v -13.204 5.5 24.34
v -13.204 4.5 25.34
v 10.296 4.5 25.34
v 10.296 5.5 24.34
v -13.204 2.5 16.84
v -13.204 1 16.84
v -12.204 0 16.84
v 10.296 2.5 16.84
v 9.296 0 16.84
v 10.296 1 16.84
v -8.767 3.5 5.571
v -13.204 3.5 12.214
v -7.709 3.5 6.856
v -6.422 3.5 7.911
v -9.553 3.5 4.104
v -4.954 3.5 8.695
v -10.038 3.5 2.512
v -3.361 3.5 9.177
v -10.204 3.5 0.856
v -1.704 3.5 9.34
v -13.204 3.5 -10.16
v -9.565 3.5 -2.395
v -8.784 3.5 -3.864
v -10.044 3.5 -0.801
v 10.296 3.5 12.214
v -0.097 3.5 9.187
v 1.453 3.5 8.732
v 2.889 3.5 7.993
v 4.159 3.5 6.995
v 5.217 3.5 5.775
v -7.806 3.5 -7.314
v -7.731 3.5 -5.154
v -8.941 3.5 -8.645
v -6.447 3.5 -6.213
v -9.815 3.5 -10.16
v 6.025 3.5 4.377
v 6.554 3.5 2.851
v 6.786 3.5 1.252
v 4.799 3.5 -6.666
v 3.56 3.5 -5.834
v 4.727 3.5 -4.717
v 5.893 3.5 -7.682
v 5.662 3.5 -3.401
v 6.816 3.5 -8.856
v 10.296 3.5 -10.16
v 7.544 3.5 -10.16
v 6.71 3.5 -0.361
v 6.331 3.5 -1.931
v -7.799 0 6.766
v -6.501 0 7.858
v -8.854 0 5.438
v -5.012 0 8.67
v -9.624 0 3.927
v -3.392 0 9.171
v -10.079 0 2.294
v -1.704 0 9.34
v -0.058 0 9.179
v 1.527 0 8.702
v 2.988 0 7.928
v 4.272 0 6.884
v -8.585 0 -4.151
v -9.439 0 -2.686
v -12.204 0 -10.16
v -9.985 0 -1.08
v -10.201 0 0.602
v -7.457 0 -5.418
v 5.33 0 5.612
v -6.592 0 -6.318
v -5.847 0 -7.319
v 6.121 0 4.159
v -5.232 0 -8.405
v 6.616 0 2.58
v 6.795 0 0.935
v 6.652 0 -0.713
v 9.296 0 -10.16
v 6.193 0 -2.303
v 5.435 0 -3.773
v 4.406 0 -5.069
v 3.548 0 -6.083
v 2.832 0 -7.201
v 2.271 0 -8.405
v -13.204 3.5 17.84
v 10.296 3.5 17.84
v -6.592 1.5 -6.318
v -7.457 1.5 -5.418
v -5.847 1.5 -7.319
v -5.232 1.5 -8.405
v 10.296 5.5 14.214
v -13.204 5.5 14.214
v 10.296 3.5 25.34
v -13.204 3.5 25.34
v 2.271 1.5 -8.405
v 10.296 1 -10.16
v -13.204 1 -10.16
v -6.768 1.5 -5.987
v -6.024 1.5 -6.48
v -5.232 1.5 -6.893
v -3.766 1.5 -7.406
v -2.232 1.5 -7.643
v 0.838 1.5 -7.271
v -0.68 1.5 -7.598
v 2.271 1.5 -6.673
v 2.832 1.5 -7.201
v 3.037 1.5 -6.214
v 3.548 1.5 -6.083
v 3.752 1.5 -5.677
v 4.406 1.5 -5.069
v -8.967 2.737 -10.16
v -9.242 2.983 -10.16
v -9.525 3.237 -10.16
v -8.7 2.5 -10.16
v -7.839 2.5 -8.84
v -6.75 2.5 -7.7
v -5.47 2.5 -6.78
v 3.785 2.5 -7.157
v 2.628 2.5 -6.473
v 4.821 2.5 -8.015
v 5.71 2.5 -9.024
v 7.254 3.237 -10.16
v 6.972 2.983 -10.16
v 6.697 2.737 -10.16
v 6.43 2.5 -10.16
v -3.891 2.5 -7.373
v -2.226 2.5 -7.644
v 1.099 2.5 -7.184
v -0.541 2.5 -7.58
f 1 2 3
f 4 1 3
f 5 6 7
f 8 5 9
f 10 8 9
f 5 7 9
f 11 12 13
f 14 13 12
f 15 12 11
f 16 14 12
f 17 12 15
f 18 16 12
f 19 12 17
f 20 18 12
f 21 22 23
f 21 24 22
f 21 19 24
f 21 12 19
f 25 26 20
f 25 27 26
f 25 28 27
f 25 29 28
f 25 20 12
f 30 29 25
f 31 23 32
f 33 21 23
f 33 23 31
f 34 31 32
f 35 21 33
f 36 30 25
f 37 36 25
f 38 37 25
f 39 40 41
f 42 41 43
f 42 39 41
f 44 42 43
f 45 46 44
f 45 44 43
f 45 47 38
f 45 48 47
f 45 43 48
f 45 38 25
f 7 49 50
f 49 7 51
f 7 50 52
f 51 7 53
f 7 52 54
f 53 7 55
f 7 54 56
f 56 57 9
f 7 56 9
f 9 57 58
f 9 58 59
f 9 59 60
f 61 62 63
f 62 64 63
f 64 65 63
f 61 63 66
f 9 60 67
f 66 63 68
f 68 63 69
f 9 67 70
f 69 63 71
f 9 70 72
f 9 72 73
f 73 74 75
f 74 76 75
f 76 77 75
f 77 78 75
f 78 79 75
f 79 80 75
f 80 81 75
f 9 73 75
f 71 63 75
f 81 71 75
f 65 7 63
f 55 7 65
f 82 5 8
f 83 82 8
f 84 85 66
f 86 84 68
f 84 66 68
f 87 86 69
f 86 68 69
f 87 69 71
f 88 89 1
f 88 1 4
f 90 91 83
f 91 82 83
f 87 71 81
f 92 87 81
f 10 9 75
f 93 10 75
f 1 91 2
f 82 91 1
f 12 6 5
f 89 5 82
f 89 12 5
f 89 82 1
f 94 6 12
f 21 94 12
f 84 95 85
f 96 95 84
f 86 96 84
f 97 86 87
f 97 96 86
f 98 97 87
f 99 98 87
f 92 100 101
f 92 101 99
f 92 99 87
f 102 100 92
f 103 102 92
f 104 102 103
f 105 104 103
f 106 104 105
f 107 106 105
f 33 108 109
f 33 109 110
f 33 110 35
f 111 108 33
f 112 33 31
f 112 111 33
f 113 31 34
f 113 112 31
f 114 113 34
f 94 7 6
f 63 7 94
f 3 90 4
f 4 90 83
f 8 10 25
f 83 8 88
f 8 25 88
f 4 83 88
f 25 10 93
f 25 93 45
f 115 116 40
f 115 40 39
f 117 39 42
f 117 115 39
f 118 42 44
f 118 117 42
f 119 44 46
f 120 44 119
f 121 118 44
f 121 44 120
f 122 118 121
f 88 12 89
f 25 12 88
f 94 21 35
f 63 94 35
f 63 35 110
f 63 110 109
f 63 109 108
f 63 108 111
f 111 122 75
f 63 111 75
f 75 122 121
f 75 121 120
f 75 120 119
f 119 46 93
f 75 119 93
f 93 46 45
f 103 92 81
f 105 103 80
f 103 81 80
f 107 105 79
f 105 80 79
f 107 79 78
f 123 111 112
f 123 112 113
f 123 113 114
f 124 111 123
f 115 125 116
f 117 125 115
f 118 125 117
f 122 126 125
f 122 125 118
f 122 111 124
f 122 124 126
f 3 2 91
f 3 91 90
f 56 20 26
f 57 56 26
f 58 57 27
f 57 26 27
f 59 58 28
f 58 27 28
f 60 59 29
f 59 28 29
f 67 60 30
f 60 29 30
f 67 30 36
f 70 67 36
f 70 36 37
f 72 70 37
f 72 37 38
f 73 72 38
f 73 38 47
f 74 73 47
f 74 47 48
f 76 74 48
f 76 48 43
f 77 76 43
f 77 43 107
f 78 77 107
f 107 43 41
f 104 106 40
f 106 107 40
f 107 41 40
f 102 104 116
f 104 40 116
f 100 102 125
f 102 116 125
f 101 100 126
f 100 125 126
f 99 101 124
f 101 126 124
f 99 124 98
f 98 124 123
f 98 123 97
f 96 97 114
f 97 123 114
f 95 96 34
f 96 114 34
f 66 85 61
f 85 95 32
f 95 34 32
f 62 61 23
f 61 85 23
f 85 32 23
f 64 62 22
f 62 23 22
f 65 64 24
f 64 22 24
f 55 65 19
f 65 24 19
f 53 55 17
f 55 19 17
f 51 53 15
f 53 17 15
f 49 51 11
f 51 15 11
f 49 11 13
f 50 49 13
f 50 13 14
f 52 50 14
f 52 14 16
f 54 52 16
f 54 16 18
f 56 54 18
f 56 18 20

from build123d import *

# Parameters (mm, degrees)
SKETCH1_W           = 23.5
SKETCH1_H           = 28
BOSS_EXTRUDE1_DEPTH = 3.5
CHAMFER1_SIZE       = 1
SKETCH2_R           = 8.5
CUT_EXTRUDE1_DEPTH  = 3.5
SKETCH3_R           = 9.555523526
CUT_EXTRUDE3_DEPTH  = 1
CHAMFER2_SIZE       = 1
SKETCH4_W           = 23.5
SKETCH4_H           = 9.126491789
BOSS_EXTRUDE2_DEPTH = 2
CHAMFER3_SIZE       = 2
CHAMFER4_SIZE       = 1
SKETCH5_W           = 7.502434646
SKETCH5_H           = 2.891999948
CUT_EXTRUDE4_DEPTH  = 1.5
FILLET1_R           = 10
SKETCH6_W           = 23.5
SKETCH6_H           = 2
BOSS_EXTRUDE3_DEPTH = 2
SKETCH7_W           = 25.736202914
SKETCH7_H           = 1.90415655
CUT_EXTRUDE6_DEPTH  = 7
CHAMFER5_SIZE       = 1


# Some blends are built 0.0001 mm under size
with BuildPart() as part:
    # Sketch1 → Boss-Extrude1 (new body)
    with BuildSketch(Plane(origin=(0, 0, 0), x_dir=(1, 0, 0), z_dir=(0, 1, 0))):
        with Locations((-1.454397394, -2.840390879)):
            Rectangle(SKETCH1_W, SKETCH1_H)
    extrude(amount=BOSS_EXTRUDE1_DEPTH)

    # Chamfer1
    chamfer1_edges = [part.edges().sort_by_distance(p)[0] for p in [
        (-1.454397394, 0, -11.159609121),
        (10.295602606, 0, 2.840390879),
        (-13.204397394, 0, 2.840390879),
    ]]
    chamfer(chamfer1_edges, length=CHAMFER1_SIZE)

    # Sketch2 → Cut-Extrude1 (cut)
    with BuildSketch(Plane(origin=(0, 3.5, 0), x_dir=(1, 0, 0), z_dir=(0, 1, 0))):
        with Locations(Location((-1.704397394, -0.840390879, 0), (0, 0, 270))):
            Circle(SKETCH2_R)
    extrude(amount=-CUT_EXTRUDE1_DEPTH, mode=Mode.SUBTRACT)

    # Sketch3 → Cut-Extrude3 (cut)
    with BuildSketch(Plane(origin=(0, 3.5, 0), x_dir=(1, 0, 0), z_dir=(0, 1, 0))):
        with Locations((-1.135292968, 14.156160389)):
            Circle(SKETCH3_R)
    extrude(amount=-CUT_EXTRUDE3_DEPTH, mode=Mode.SUBTRACT)

    # Chamfer2
    chamfer2_edges = [part.edges().sort_by_distance(p)[0] for p in [
        (-8.74141347, 2.5, -8.372134044),
        (6.246016299, 2.5, -8.087857218),
    ]]
    chamfer(chamfer2_edges, length=CHAMFER2_SIZE - 0.0001)  # a hair under: the kernel refuses the full size

    # Sketch4 → Boss-Extrude2 (add)
    with BuildSketch(Plane(origin=(0, 3.5, 0), x_dir=(1, 0, 0), z_dir=(0, 1, 0))):
        with Locations((-1.454397394, -18.777144985)):
            Rectangle(SKETCH4_W, SKETCH4_H)
    extrude(amount=BOSS_EXTRUDE2_DEPTH)

    # Chamfer3
    chamfer3_edges = [part.edges().sort_by_distance(p)[0] for p in [
        (-1.454397394, 3.5, 14.21389909),
    ]]
    chamfer(chamfer3_edges, length=CHAMFER3_SIZE - 0.0001)  # a hair under: the kernel refuses the full size

    # Chamfer4
    chamfer4_edges = [part.edges().sort_by_distance(p)[0] for p in [
        (-1.454397394, 3.5, 16.840390879),
    ]]
    chamfer(chamfer4_edges, length=CHAMFER4_SIZE)

    # Sketch5 → Cut-Extrude4 (cut)
    with BuildSketch(Plane.XZ):
        with Locations((-1.480612468, -6.958763205)):
            Rectangle(SKETCH5_W, SKETCH5_H)
    extrude(amount=-CUT_EXTRUDE4_DEPTH, mode=Mode.SUBTRACT)

    # Fillet1
    # the kernel refuses this fillet: 10 mm, written as the material it takes off along each edge
    with BuildSketch(Plane(origin=(2.270604855, -6.676580089, -6.67288784), x_dir=(0.799474341505259, 0, 0.6007002391165933), z_dir=(0, 1, 0))) as fillet1_piece_1:
        with BuildLine():
            CenterArc((4.241592057, 9.875833363), FILLET1_R, 238.116555861, 22.84506635)
            Line((-1.04033793, 1.384589896), (0, 0))
            ThreePointArc((0, 0), (1.335316018, 0.105541642), (2.670632036, 0))
        make_face()
    extrude(amount=8.176580089, mode=Mode.SUBTRACT)
    with BuildSketch(Plane(origin=(-5.231829791, -6.674182658, -6.89312195), x_dir=(-0.8333660281094135, 0, 0.552721505998401), z_dir=(0, 1, 0))) as fillet1_piece_2:
        with BuildLine():
            CenterArc((4.240068983, -9.875923079), FILLET1_R, 99.035105105, 21.466237943)
            Line((-0.835516616, -1.259750447), (0, 0))
            ThreePointArc((0, 0), (1.334836532, -0.105465383), (2.669673063, 0))
        make_face()
    extrude(amount=8.174182658, mode=Mode.SUBTRACT)

    # Sketch6 → Boss-Extrude3 (add)
    with BuildSketch(Plane.XY.offset(23.340390879)):
        with Locations((-1.454397394, 4.5)):
            Rectangle(SKETCH6_W, SKETCH6_H)
    extrude(amount=BOSS_EXTRUDE3_DEPTH)

    # Sketch7 → Cut-Extrude6 (cut)
    with BuildSketch(Plane(origin=(0, 3.5, 0), x_dir=(1, 0, 0), z_dir=(0, 1, 0))):
        with Locations((-1.767118607, 11.111687396)):
            Rectangle(SKETCH7_W, SKETCH7_H)
    extrude(amount=-CUT_EXTRUDE6_DEPTH, mode=Mode.SUBTRACT)

    # Chamfer5
    chamfer5_edges = [part.edges().sort_by_distance(p)[0] for p in [
        (-1.454397394, 5.5, 25.340390879),
    ]]
    chamfer(chamfer5_edges, length=CHAMFER5_SIZE)


solid = part.part
